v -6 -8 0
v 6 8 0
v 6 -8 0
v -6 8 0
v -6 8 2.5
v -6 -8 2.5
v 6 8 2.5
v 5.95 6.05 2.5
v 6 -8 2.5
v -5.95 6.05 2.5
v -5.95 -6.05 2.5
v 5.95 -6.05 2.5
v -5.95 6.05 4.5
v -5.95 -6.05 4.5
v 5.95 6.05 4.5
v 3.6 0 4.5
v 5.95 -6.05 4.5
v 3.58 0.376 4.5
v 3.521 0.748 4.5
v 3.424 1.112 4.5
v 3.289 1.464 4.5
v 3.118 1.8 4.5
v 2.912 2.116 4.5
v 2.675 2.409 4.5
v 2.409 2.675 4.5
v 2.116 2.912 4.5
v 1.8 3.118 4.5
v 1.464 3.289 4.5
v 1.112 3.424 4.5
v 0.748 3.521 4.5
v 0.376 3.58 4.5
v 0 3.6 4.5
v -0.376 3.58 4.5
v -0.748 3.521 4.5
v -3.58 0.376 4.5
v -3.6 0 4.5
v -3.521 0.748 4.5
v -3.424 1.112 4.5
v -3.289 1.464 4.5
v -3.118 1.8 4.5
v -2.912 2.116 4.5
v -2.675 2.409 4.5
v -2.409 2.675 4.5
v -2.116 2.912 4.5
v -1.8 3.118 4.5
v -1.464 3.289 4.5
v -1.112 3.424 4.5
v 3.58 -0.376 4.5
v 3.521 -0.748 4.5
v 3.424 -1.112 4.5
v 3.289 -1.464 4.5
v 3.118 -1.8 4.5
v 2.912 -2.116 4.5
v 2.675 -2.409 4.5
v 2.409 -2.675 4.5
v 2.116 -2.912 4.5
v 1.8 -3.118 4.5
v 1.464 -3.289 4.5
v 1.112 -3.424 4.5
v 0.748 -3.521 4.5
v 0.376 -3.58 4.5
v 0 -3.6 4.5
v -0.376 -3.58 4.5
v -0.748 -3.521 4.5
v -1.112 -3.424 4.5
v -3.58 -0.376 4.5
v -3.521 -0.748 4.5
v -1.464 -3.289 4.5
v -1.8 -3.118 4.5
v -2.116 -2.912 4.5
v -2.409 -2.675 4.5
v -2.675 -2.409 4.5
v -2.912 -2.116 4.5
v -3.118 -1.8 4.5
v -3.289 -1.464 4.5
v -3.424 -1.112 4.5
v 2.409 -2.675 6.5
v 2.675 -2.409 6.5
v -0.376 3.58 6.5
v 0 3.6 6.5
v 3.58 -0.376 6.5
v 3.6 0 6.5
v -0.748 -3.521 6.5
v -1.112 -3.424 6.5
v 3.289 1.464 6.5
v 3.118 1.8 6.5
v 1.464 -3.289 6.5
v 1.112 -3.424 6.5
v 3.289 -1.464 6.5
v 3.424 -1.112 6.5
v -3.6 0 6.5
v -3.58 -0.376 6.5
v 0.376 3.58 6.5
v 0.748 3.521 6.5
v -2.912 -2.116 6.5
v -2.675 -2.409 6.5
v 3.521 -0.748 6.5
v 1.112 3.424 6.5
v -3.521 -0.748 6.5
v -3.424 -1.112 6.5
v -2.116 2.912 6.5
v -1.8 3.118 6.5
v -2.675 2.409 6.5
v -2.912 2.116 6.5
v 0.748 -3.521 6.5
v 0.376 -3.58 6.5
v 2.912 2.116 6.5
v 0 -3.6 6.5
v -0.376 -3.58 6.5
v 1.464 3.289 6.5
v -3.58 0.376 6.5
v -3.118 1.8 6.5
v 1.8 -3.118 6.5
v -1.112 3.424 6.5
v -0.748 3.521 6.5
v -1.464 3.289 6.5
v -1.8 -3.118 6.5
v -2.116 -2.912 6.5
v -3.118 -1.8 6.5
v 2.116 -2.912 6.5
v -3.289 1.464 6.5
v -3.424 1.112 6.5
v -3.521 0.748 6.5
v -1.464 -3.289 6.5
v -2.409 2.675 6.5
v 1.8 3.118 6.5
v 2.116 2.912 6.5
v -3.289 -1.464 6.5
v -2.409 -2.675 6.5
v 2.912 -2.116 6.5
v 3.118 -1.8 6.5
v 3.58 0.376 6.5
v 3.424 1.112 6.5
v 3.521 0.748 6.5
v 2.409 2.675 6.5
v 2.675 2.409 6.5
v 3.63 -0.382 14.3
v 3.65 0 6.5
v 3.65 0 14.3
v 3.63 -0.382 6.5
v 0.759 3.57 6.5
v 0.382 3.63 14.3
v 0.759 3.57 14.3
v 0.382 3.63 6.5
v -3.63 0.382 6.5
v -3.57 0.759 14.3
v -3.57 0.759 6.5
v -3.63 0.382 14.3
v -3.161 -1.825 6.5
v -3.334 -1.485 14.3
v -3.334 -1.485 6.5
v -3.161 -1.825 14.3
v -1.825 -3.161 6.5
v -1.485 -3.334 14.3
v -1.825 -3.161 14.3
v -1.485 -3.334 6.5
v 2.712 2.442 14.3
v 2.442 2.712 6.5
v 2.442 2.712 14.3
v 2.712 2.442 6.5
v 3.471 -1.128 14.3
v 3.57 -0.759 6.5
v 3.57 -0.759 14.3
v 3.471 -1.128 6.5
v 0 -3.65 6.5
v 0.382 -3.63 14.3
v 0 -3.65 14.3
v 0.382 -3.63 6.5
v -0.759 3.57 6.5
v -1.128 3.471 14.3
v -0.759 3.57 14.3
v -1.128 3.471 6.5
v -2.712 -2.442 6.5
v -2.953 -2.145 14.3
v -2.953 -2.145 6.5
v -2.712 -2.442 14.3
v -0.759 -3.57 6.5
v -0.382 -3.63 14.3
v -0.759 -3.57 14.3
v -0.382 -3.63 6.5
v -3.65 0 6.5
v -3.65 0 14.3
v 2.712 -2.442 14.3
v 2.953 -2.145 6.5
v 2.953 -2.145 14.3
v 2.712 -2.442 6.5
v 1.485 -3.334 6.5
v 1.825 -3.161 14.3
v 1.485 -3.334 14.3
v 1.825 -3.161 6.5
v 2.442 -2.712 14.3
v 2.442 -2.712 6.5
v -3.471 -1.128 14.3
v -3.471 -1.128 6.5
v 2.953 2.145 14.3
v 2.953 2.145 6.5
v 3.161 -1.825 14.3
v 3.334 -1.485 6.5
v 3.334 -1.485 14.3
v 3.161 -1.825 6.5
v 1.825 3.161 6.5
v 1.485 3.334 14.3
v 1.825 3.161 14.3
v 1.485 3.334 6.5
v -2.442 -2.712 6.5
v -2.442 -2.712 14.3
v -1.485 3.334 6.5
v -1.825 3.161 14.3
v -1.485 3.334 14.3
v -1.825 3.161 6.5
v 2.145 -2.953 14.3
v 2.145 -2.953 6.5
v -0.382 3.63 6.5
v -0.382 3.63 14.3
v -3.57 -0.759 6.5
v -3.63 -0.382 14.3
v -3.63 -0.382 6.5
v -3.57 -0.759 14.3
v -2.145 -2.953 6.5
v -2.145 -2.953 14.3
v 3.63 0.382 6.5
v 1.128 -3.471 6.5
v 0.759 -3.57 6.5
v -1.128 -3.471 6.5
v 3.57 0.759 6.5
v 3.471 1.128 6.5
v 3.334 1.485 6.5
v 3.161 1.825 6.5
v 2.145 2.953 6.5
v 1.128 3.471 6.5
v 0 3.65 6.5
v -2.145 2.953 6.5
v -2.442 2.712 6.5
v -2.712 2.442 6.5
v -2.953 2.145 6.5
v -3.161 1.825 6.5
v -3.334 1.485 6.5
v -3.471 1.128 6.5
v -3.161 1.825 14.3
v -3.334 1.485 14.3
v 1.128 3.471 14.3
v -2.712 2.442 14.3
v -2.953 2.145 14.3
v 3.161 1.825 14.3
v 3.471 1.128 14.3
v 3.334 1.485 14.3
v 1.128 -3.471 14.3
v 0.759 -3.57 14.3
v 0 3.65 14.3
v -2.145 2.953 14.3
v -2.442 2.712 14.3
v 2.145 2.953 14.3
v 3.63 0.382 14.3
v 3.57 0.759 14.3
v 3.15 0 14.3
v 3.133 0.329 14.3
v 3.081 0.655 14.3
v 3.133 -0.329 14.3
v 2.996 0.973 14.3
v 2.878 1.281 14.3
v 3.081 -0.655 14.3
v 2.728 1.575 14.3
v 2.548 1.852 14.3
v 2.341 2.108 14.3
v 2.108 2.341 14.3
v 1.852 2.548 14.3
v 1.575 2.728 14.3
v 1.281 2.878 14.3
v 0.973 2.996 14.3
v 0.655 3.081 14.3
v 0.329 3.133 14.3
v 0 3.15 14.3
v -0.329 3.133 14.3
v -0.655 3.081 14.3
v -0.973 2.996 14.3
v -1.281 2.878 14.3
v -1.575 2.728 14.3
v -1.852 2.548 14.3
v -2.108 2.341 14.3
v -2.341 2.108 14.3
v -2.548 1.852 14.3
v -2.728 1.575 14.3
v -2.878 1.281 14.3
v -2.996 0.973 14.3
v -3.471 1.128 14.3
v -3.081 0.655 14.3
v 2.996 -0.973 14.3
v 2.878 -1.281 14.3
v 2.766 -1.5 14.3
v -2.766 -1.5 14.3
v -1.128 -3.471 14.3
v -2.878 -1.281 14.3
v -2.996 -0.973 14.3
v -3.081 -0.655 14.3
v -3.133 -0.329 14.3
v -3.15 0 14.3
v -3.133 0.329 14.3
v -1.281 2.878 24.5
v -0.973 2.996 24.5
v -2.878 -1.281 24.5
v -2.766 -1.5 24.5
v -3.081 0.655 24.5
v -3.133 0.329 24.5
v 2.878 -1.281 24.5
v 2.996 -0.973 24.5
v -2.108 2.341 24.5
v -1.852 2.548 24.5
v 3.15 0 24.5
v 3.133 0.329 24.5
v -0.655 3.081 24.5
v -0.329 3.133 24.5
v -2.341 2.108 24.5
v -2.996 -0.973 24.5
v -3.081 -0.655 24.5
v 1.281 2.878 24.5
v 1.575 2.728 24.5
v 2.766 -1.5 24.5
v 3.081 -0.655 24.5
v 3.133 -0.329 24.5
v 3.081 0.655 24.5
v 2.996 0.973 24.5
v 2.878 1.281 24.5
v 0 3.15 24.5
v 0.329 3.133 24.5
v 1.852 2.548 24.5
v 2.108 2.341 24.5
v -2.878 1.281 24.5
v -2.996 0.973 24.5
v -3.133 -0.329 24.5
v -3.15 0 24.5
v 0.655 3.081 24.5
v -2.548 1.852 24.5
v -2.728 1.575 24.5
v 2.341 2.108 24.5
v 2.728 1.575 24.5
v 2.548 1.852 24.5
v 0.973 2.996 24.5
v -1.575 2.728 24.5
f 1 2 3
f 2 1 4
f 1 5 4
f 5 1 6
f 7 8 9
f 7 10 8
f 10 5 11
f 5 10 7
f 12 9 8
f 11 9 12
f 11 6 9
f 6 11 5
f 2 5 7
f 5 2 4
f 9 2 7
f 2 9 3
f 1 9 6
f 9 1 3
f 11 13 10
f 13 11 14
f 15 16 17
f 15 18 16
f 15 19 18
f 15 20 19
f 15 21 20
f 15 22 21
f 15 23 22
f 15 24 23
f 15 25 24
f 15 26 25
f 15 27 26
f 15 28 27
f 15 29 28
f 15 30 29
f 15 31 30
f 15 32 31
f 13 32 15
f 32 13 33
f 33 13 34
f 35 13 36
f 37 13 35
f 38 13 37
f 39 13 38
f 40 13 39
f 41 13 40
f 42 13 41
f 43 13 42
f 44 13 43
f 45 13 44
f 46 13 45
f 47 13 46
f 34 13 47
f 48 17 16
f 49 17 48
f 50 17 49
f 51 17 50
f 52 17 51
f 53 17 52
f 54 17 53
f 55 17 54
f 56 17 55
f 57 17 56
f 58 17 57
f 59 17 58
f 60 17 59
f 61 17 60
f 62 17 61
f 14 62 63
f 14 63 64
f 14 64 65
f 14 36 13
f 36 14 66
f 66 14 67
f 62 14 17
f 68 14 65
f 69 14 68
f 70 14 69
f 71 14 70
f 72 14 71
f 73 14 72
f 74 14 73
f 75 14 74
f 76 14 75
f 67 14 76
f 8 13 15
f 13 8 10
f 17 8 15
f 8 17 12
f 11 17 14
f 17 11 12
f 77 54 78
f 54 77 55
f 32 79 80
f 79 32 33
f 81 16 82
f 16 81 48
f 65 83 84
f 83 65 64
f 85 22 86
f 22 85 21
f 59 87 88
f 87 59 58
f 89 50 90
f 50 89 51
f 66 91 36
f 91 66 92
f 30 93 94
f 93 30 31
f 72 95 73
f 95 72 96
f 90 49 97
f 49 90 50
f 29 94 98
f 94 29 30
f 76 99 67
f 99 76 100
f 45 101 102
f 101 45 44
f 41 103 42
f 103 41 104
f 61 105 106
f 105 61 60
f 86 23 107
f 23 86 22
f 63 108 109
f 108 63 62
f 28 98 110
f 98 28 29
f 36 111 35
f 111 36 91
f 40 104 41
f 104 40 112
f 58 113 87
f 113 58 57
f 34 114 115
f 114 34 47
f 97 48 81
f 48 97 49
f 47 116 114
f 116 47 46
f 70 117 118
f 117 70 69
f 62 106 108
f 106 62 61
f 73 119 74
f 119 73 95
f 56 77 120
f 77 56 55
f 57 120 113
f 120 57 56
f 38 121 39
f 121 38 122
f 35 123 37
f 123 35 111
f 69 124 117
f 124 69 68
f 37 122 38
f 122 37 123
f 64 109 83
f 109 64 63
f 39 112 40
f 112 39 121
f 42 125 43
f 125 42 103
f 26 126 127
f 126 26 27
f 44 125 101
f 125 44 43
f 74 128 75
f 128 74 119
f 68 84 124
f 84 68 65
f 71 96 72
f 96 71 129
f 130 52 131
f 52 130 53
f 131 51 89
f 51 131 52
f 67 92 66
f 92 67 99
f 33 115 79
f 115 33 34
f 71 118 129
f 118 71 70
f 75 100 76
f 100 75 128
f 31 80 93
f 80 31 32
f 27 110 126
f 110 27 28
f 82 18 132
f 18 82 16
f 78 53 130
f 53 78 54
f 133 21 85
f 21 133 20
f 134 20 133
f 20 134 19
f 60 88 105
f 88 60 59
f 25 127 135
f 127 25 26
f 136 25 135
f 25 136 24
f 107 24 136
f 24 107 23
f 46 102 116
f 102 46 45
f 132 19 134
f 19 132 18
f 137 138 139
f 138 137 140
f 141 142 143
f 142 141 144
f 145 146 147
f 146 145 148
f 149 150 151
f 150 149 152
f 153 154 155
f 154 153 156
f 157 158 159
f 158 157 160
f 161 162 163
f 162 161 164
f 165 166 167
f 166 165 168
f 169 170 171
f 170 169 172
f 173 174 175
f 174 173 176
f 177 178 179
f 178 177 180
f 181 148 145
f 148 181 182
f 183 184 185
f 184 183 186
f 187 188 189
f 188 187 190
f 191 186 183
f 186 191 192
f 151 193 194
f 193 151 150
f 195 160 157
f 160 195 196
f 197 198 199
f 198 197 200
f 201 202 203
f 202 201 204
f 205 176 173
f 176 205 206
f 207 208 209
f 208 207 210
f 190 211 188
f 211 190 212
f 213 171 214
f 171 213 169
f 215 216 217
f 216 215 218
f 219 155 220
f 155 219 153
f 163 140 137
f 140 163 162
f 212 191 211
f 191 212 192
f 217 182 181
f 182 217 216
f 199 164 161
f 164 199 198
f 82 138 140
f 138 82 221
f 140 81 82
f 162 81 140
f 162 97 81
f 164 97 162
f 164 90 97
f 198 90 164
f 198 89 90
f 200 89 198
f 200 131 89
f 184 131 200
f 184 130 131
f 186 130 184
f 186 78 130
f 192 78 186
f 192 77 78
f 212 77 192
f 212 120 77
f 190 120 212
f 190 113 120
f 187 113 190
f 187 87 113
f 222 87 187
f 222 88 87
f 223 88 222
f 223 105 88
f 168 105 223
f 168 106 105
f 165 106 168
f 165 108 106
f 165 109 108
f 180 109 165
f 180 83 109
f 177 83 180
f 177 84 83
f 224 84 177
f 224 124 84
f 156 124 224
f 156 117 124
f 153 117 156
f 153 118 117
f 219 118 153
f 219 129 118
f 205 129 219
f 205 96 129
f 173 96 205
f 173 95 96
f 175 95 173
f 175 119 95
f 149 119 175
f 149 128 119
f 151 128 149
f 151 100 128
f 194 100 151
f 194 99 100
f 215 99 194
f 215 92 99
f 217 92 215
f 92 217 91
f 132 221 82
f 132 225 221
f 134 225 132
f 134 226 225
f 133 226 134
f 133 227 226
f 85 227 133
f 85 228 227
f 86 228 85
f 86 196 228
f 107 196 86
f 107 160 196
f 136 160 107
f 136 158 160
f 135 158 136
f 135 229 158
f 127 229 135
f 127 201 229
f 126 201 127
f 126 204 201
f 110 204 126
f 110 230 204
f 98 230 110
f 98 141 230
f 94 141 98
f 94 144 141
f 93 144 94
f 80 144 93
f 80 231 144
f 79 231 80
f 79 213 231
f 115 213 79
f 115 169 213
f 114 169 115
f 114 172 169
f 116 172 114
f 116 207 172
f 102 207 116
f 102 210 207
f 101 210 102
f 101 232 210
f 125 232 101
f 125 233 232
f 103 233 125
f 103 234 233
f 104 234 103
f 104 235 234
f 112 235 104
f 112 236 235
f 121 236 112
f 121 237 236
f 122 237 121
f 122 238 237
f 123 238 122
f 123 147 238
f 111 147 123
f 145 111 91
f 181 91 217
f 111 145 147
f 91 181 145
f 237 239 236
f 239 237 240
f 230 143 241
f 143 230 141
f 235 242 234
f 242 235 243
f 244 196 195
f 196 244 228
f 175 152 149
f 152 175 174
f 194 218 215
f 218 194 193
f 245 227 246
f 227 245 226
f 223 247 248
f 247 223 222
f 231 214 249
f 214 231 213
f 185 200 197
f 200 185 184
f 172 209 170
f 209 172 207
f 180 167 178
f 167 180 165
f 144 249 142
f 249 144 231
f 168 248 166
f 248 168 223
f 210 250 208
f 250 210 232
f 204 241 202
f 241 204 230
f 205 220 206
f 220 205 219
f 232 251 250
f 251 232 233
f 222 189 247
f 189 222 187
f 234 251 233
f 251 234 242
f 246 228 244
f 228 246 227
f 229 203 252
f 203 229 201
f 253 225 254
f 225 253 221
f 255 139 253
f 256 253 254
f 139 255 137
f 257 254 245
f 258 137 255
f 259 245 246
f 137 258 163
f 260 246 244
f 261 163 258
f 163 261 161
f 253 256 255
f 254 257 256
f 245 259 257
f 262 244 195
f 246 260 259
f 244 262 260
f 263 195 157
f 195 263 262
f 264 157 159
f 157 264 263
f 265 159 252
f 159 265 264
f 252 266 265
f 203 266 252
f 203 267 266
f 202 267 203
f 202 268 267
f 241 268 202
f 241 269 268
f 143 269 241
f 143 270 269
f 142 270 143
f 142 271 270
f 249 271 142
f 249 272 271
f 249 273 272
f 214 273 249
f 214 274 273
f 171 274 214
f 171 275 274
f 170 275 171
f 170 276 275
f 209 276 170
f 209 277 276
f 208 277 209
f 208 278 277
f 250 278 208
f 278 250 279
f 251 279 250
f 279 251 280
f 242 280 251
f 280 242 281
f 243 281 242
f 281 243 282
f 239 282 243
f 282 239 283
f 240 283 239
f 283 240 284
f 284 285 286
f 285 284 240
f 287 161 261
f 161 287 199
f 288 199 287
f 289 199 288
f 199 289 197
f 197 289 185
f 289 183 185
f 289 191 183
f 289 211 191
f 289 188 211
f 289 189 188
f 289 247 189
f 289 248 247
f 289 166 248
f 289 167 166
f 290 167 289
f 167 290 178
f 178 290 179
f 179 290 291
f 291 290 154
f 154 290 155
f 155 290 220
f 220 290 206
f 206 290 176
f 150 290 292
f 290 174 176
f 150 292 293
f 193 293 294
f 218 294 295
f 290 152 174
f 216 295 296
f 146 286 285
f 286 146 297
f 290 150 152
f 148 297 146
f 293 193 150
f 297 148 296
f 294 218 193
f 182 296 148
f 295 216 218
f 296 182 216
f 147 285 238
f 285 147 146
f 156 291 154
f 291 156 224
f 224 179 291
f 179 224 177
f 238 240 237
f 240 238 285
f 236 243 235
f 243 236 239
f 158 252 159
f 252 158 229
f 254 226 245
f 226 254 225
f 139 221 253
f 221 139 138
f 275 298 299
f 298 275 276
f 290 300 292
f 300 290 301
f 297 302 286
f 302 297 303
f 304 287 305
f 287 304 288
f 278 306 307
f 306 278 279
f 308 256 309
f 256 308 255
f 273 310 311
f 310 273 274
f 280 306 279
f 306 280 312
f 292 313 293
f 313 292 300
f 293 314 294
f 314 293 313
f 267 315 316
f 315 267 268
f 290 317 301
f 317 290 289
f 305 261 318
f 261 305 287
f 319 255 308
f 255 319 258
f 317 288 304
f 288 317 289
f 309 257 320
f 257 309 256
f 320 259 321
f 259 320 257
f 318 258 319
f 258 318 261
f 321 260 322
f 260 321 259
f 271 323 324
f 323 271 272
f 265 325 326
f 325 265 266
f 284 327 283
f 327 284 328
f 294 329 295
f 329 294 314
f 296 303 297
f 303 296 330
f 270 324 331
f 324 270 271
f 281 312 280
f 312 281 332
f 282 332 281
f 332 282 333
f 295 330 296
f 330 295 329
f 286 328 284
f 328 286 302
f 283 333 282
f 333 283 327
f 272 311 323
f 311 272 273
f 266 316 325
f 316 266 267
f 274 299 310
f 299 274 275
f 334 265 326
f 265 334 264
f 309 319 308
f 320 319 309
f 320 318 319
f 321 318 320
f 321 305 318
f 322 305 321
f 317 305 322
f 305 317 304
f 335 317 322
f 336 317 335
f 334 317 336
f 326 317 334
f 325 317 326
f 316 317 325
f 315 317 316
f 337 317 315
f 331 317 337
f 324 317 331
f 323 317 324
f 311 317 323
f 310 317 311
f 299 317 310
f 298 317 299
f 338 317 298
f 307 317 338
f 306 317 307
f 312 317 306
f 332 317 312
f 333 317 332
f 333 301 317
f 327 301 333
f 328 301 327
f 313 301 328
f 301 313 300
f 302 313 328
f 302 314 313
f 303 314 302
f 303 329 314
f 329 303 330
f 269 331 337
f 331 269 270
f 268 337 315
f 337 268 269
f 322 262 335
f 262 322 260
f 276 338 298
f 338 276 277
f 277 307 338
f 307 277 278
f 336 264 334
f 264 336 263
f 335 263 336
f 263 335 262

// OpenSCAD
/** ENCODER **/
module encoder_model() {
    // body
    linear_extrude(4.5) square([11.9, 12.1], center=true);
    translate([0,0,4.5]) linear_extrude(7) circle(d=7);
    
    // axis
    translate([0,0,4.5+7]) linear_extrude(1.6) circle(d=3.5);
    translate([0,0,4.5+7+1.6]) linear_extrude(1.1) circle(d=6);
    translate([0,0,4.5+7+1.6+1.1]) linear_extrude(10) intersection() {
        circle(d=6, $fn=$fn);
        translate([0, (6-4.2)/2,0]) square([6,4.2], center=true);
    }
    
    // pins
    rotate([180,0,0]) linear_extrude(3.5) {
        translate([11.9/2-0.5/2, 0, 0]) square([0.5, 2.5], center=true);
        translate([-11.9/2+0.5/2, 0, 0]) square([0.5, 2.5], center=true);
    }
}

module encoder_cutout(shaft_tol=0, shaft_tol_h=0, extended=0) {
    translate([0,0,-extended])  linear_extrude(2.5+extended) square([12,16], center=true);
    linear_extrude(4.5) square([11.9,12.1], center=true);
    linear_extrude(13.1) circle(d=7.2);
    color("red") translate([0,0,4.5+shaft_tol_h])  linear_extrude(9.8-shaft_tol_h) circle(d=6.9+shaft_tol);
    
    linear_extrude(14.3) circle(d=6+0.3);
    rotate([0,0,90]) linear_extrude(24.5+extended) intersection() {
        circle(d=6+0.3);
        translate([1.5,0]) square([6,6+0.3], center=true);
    }
}


encoder_cutout(shaft_tol=0.4, shaft_tol_h=2, extended=0, $fn=60);
